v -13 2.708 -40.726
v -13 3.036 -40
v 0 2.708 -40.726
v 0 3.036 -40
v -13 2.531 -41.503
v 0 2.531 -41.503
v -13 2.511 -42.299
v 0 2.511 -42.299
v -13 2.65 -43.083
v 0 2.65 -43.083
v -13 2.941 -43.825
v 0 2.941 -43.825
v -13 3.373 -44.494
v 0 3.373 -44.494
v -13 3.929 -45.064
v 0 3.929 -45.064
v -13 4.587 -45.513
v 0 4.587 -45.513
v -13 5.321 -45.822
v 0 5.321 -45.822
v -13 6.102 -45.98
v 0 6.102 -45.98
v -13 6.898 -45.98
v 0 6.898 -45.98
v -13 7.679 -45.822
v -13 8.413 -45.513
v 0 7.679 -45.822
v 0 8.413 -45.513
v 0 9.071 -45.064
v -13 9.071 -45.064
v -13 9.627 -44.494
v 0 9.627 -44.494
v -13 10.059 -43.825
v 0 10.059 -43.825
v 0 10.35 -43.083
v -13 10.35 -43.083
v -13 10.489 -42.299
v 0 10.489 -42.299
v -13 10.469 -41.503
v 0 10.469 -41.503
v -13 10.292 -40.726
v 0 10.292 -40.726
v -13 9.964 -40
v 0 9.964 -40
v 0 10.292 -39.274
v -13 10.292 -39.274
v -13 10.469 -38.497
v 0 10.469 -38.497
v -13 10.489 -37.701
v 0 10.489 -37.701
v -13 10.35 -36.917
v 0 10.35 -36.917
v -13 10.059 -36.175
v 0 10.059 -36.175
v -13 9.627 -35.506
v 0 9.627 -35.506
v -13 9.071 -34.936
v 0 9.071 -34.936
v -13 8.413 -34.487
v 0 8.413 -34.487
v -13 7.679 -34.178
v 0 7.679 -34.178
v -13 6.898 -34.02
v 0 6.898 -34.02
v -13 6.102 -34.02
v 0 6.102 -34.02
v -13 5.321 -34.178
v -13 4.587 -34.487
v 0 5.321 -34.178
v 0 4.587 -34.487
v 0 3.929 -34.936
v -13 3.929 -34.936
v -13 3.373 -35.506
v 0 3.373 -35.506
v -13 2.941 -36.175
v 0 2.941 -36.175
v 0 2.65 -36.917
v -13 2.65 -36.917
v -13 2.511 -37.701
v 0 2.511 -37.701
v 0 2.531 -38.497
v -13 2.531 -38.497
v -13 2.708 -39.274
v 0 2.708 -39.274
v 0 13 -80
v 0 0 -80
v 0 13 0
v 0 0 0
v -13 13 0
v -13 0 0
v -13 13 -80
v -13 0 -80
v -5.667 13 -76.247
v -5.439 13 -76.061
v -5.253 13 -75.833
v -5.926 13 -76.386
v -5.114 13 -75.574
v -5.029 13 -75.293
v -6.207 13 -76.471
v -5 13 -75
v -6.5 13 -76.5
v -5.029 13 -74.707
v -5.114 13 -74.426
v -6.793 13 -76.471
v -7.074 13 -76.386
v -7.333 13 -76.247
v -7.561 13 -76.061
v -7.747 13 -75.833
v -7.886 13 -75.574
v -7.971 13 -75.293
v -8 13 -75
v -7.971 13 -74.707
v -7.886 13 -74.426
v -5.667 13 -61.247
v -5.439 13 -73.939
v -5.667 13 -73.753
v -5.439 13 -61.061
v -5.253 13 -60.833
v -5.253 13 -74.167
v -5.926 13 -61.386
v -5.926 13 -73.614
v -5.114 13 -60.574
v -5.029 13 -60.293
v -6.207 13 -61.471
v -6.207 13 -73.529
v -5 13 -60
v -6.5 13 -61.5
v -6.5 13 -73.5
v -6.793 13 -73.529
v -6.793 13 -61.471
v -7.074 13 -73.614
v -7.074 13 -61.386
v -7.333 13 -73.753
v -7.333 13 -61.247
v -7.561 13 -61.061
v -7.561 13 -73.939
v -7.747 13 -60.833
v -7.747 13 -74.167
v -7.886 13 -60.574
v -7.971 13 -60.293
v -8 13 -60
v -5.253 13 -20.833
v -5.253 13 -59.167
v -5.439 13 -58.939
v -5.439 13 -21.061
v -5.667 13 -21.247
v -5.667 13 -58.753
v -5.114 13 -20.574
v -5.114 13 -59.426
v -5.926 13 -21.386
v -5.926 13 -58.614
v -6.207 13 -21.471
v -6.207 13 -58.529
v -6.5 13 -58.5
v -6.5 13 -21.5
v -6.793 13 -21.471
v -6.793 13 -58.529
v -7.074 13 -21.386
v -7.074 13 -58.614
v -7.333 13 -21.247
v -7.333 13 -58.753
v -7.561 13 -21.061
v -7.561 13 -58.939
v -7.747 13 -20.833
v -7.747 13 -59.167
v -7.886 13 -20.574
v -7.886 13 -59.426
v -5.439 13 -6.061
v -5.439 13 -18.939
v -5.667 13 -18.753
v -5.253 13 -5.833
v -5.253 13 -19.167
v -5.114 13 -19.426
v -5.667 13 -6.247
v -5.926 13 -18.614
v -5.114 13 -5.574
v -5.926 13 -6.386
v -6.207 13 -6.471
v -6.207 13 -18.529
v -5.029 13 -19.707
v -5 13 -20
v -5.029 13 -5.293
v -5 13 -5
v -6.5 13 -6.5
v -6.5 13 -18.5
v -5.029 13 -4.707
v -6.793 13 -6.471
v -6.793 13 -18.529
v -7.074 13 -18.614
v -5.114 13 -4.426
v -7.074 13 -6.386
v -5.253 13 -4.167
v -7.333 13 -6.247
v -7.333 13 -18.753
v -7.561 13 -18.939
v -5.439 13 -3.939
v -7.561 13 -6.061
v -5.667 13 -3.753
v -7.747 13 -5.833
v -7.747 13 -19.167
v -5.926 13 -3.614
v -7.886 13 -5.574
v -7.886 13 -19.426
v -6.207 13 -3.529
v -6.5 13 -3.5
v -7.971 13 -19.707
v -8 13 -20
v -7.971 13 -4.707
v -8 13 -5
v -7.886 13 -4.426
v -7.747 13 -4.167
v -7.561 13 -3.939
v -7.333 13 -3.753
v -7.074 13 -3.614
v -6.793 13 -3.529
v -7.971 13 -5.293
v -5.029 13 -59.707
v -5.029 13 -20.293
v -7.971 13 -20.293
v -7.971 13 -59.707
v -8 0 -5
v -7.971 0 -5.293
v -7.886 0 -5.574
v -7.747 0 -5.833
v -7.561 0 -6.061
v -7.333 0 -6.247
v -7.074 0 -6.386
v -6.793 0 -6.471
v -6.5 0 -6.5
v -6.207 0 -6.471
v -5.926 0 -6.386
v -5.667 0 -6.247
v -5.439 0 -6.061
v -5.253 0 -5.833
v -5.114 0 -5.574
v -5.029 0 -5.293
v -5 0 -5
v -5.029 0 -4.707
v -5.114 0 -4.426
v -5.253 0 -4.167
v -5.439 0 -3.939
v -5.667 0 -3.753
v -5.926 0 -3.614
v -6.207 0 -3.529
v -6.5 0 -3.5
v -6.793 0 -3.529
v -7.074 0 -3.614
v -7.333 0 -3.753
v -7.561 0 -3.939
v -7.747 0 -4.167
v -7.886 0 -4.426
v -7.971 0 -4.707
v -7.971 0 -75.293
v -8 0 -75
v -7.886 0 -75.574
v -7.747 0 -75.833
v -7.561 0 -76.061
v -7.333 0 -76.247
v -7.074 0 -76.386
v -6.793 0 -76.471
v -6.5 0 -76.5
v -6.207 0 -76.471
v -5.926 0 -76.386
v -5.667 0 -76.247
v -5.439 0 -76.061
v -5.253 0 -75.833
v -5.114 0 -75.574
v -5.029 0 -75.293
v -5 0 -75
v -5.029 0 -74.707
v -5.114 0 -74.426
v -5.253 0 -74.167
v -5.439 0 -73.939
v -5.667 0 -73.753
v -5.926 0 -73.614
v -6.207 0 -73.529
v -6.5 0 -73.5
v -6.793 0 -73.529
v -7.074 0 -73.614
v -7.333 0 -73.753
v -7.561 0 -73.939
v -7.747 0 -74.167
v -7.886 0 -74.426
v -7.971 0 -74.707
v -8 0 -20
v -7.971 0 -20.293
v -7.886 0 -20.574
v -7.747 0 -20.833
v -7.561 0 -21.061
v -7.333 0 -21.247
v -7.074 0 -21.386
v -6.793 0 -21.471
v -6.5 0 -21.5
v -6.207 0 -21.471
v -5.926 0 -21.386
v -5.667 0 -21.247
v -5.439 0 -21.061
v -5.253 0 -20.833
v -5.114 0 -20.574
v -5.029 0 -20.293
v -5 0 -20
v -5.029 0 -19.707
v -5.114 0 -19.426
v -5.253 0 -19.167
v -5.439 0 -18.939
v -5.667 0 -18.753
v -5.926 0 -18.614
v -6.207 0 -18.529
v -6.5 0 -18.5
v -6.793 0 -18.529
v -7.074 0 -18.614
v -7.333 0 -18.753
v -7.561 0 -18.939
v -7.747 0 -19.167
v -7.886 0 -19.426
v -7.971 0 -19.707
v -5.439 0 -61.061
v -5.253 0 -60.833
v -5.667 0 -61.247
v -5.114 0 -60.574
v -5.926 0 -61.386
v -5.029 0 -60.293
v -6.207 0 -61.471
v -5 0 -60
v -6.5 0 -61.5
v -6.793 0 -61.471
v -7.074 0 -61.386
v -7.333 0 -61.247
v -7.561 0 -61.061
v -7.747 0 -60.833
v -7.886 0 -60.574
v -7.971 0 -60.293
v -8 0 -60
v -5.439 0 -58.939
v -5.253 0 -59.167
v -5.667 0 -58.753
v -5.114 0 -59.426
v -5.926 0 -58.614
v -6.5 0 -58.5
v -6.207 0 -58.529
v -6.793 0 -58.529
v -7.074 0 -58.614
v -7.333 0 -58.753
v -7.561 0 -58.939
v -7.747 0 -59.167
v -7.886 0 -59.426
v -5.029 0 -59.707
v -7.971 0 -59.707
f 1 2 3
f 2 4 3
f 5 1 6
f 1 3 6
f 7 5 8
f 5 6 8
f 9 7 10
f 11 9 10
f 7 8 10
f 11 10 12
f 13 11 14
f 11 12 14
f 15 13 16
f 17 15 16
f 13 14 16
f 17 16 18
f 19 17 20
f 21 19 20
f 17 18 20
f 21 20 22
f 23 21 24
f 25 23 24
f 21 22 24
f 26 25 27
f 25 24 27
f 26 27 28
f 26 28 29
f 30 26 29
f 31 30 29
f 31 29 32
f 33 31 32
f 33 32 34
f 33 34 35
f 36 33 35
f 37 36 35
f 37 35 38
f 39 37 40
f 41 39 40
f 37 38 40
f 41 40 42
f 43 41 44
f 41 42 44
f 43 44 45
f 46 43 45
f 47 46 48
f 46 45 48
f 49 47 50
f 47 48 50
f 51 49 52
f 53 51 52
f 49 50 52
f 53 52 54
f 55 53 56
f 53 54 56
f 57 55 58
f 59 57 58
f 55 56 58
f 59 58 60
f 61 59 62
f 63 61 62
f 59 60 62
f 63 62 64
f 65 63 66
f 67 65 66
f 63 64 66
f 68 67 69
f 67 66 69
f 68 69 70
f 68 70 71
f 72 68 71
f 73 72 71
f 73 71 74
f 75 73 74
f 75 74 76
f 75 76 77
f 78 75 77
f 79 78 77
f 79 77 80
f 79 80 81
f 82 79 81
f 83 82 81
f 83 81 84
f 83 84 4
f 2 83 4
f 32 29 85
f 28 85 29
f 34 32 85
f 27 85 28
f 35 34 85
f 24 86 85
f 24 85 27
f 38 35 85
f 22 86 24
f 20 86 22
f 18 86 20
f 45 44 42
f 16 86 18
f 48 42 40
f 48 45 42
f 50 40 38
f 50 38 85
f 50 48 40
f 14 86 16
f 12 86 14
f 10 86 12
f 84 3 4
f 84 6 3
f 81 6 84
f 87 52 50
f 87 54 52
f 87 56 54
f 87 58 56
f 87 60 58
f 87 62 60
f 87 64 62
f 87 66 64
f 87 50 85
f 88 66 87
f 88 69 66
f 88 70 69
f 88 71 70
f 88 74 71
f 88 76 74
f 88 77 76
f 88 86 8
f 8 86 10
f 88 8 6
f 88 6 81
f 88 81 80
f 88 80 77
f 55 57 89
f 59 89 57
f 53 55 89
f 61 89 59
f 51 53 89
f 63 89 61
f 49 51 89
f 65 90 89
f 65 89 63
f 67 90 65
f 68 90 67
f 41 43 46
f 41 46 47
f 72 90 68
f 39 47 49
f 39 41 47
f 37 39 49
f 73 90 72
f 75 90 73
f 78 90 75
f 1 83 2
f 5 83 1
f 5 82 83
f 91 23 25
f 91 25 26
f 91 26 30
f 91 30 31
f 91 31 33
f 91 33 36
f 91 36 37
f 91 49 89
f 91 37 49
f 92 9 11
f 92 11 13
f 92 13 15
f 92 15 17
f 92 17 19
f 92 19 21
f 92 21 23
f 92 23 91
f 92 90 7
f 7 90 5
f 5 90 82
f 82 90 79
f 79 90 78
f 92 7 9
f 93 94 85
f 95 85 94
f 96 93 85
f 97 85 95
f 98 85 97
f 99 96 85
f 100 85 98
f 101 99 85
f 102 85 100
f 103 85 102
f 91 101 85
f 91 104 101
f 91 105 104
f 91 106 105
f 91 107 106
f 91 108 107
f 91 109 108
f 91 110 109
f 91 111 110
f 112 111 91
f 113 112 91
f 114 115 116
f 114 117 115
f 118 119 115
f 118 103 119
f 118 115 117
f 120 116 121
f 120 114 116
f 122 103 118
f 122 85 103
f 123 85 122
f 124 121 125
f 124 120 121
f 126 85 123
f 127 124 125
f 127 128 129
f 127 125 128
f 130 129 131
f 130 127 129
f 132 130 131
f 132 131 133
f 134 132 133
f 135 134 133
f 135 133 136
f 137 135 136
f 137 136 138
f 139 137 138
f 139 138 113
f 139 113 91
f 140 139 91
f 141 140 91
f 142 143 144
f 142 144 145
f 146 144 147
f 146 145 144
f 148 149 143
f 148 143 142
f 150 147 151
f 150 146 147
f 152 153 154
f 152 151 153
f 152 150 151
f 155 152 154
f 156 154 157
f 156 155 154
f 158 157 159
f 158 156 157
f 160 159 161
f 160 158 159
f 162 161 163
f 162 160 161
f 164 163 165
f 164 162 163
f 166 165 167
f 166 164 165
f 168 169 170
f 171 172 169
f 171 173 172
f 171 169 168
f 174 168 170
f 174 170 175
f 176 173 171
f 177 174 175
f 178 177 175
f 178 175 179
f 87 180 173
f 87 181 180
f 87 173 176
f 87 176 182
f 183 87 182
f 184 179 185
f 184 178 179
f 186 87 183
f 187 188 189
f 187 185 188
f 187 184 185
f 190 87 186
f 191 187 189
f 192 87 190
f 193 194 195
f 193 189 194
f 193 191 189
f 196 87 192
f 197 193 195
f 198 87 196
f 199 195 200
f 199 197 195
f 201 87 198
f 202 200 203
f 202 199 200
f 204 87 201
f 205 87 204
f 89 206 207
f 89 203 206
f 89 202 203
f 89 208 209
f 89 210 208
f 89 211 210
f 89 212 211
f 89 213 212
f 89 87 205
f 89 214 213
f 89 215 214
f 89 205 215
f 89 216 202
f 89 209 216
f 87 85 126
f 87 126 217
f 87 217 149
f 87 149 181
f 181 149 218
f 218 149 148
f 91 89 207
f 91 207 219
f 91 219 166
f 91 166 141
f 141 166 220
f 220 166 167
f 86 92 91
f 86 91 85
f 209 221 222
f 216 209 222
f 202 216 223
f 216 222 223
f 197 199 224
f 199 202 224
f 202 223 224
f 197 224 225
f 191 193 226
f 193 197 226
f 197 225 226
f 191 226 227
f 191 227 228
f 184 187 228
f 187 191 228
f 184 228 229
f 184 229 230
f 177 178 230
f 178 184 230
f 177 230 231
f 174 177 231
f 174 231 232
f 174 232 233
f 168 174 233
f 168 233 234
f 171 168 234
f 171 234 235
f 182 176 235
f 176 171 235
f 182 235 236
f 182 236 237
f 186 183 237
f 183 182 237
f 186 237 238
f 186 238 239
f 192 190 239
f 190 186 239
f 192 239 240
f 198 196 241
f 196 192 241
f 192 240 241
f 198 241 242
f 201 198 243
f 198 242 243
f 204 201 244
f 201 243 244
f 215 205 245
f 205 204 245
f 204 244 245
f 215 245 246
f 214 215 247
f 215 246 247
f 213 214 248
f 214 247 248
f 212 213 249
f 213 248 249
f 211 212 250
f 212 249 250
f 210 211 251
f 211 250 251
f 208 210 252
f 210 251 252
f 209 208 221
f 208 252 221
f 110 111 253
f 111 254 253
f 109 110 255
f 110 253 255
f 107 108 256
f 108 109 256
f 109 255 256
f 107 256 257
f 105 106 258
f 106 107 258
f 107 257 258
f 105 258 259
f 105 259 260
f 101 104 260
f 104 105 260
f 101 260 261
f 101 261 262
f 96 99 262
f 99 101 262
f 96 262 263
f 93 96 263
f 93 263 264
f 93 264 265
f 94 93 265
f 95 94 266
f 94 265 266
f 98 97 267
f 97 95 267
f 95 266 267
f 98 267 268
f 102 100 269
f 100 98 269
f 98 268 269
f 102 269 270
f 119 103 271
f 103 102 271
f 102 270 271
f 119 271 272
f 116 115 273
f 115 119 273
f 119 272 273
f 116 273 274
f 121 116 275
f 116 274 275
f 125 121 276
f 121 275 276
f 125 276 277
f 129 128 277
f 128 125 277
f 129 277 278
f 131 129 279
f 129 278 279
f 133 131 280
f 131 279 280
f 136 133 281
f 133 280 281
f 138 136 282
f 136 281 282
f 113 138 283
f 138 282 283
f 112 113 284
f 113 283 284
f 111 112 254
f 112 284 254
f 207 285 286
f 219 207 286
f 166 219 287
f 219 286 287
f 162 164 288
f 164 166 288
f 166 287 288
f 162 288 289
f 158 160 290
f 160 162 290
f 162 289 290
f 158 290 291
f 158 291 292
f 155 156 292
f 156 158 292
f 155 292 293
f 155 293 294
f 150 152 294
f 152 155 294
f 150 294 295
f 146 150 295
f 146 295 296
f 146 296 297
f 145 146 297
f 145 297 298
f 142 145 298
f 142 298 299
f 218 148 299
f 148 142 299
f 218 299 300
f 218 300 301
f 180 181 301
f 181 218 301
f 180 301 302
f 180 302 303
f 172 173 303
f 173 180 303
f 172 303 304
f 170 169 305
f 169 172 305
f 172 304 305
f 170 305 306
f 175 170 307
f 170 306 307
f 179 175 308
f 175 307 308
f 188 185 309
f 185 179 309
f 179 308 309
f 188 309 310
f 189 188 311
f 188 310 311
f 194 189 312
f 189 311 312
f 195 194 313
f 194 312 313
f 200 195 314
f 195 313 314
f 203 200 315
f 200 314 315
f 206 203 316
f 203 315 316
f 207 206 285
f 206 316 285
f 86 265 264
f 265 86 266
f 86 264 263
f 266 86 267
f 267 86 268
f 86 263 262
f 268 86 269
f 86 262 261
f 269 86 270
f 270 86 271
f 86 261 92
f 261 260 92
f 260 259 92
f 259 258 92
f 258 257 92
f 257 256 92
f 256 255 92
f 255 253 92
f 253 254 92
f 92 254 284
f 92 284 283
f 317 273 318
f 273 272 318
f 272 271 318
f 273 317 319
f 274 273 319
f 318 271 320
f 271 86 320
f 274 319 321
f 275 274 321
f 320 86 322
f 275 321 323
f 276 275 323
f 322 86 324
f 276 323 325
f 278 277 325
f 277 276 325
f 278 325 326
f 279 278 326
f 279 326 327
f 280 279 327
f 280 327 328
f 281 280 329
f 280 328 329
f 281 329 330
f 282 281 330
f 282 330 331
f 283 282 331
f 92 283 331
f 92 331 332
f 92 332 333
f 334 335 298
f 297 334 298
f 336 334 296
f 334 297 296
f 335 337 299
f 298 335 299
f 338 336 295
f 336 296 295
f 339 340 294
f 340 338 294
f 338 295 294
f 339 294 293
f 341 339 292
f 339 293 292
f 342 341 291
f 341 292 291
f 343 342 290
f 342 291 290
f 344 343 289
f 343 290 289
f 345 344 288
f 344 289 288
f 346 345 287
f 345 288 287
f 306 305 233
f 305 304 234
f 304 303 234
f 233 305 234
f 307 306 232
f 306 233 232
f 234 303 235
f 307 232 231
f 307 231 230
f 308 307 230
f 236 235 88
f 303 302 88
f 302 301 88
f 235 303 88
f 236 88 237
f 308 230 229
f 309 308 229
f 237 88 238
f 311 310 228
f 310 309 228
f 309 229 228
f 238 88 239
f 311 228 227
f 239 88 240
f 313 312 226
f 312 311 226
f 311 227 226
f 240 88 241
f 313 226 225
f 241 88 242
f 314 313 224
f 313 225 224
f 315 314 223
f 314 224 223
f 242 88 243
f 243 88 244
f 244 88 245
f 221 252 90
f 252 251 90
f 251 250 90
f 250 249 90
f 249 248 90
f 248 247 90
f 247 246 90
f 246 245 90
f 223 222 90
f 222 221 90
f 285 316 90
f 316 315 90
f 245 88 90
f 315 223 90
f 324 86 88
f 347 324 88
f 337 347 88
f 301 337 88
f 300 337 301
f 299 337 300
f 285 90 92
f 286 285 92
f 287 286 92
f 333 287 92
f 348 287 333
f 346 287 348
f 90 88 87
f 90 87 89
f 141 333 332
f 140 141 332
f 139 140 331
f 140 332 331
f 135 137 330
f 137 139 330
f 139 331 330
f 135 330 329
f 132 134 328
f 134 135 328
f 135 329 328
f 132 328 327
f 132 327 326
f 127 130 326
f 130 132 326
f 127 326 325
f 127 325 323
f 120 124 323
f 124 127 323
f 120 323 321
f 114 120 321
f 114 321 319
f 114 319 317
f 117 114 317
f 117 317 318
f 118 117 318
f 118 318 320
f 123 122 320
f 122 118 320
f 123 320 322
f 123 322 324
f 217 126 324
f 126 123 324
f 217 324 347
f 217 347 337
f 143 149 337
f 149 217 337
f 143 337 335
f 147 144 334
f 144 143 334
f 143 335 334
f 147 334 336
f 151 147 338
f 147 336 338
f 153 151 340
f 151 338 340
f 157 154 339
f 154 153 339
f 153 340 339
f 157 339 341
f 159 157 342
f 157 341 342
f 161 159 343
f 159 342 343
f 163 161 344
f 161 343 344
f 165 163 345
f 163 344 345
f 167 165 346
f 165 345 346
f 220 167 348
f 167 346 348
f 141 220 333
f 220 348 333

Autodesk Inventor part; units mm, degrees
ref_plane "YZ Plane" through (0, 0, 0) normal (1, 0, 0) x (0, 1, 0)
ref_plane "XZ Plane" through (0, 0, 0) normal (0, 1, 0) x (-1, 0, 0)
ref_plane "XY Plane" through (0, 0, 0) normal (0, 0, 1) x (1, 0, 0)
sketch "Sketch1" plane through (0, 0, 0) normal (0, 1, 0) x (-1, 0, 0)
  line L0 (0, 0) -> (13, 0)
  line L1 (13, 0) -> (13, -80)
  line L2 (13, -80) -> (0, -80)
  line L3 (0, -80) -> (0, 0)
  circle A0 centre (6.5, -60) radius 1.5
  circle A1 centre (6.5, -75) radius 1.5
  circle A2 centre (6.5, -20) radius 1.5
  circle A3 centre (6.5, -5) radius 1.5
  point P0 (6.5, -80)
  point P1 (6.5, 0)
  dimension "d0" = 13
  dimension "d1" = 80
  dimension "d2" = 3
  dimension "d3" = 20
  dimension "d4" = 3
  dimension "d5" = 5
  dimension "d6" = 3
  dimension "d7" = 3
  dimension "d8" = 5
  dimension "d9" = 20
extrude "Extrusion1" add sketch "Sketch1" along normal blind 13
sketch "Sketch2" plane through (0, 0, 0) normal (1, 0, 0) x (0, 0, -1)
  arc A0 (40, 9.9641) -> (40, 3.0359) centre (38, 6.5) ccw
  arc A1 (40, 3.0359) -> (40, 9.9641) centre (42, 6.5) ccw
  line L0 (0, 13) -> (80, 13) construction
  line L1 (80, 0) -> (80, 13) construction
  point P0 (0, 0)
  point P1 (40, 13)
  point P2 (80, 6.5)
  point P3 (80, 6.5)
  dimension "d12" = 8
  dimension "d13" = 8
extrude "Extrusion2" cut sketch "Sketch2" against normal blind 13
properties part number "celda" material "Aluminum 6061"
